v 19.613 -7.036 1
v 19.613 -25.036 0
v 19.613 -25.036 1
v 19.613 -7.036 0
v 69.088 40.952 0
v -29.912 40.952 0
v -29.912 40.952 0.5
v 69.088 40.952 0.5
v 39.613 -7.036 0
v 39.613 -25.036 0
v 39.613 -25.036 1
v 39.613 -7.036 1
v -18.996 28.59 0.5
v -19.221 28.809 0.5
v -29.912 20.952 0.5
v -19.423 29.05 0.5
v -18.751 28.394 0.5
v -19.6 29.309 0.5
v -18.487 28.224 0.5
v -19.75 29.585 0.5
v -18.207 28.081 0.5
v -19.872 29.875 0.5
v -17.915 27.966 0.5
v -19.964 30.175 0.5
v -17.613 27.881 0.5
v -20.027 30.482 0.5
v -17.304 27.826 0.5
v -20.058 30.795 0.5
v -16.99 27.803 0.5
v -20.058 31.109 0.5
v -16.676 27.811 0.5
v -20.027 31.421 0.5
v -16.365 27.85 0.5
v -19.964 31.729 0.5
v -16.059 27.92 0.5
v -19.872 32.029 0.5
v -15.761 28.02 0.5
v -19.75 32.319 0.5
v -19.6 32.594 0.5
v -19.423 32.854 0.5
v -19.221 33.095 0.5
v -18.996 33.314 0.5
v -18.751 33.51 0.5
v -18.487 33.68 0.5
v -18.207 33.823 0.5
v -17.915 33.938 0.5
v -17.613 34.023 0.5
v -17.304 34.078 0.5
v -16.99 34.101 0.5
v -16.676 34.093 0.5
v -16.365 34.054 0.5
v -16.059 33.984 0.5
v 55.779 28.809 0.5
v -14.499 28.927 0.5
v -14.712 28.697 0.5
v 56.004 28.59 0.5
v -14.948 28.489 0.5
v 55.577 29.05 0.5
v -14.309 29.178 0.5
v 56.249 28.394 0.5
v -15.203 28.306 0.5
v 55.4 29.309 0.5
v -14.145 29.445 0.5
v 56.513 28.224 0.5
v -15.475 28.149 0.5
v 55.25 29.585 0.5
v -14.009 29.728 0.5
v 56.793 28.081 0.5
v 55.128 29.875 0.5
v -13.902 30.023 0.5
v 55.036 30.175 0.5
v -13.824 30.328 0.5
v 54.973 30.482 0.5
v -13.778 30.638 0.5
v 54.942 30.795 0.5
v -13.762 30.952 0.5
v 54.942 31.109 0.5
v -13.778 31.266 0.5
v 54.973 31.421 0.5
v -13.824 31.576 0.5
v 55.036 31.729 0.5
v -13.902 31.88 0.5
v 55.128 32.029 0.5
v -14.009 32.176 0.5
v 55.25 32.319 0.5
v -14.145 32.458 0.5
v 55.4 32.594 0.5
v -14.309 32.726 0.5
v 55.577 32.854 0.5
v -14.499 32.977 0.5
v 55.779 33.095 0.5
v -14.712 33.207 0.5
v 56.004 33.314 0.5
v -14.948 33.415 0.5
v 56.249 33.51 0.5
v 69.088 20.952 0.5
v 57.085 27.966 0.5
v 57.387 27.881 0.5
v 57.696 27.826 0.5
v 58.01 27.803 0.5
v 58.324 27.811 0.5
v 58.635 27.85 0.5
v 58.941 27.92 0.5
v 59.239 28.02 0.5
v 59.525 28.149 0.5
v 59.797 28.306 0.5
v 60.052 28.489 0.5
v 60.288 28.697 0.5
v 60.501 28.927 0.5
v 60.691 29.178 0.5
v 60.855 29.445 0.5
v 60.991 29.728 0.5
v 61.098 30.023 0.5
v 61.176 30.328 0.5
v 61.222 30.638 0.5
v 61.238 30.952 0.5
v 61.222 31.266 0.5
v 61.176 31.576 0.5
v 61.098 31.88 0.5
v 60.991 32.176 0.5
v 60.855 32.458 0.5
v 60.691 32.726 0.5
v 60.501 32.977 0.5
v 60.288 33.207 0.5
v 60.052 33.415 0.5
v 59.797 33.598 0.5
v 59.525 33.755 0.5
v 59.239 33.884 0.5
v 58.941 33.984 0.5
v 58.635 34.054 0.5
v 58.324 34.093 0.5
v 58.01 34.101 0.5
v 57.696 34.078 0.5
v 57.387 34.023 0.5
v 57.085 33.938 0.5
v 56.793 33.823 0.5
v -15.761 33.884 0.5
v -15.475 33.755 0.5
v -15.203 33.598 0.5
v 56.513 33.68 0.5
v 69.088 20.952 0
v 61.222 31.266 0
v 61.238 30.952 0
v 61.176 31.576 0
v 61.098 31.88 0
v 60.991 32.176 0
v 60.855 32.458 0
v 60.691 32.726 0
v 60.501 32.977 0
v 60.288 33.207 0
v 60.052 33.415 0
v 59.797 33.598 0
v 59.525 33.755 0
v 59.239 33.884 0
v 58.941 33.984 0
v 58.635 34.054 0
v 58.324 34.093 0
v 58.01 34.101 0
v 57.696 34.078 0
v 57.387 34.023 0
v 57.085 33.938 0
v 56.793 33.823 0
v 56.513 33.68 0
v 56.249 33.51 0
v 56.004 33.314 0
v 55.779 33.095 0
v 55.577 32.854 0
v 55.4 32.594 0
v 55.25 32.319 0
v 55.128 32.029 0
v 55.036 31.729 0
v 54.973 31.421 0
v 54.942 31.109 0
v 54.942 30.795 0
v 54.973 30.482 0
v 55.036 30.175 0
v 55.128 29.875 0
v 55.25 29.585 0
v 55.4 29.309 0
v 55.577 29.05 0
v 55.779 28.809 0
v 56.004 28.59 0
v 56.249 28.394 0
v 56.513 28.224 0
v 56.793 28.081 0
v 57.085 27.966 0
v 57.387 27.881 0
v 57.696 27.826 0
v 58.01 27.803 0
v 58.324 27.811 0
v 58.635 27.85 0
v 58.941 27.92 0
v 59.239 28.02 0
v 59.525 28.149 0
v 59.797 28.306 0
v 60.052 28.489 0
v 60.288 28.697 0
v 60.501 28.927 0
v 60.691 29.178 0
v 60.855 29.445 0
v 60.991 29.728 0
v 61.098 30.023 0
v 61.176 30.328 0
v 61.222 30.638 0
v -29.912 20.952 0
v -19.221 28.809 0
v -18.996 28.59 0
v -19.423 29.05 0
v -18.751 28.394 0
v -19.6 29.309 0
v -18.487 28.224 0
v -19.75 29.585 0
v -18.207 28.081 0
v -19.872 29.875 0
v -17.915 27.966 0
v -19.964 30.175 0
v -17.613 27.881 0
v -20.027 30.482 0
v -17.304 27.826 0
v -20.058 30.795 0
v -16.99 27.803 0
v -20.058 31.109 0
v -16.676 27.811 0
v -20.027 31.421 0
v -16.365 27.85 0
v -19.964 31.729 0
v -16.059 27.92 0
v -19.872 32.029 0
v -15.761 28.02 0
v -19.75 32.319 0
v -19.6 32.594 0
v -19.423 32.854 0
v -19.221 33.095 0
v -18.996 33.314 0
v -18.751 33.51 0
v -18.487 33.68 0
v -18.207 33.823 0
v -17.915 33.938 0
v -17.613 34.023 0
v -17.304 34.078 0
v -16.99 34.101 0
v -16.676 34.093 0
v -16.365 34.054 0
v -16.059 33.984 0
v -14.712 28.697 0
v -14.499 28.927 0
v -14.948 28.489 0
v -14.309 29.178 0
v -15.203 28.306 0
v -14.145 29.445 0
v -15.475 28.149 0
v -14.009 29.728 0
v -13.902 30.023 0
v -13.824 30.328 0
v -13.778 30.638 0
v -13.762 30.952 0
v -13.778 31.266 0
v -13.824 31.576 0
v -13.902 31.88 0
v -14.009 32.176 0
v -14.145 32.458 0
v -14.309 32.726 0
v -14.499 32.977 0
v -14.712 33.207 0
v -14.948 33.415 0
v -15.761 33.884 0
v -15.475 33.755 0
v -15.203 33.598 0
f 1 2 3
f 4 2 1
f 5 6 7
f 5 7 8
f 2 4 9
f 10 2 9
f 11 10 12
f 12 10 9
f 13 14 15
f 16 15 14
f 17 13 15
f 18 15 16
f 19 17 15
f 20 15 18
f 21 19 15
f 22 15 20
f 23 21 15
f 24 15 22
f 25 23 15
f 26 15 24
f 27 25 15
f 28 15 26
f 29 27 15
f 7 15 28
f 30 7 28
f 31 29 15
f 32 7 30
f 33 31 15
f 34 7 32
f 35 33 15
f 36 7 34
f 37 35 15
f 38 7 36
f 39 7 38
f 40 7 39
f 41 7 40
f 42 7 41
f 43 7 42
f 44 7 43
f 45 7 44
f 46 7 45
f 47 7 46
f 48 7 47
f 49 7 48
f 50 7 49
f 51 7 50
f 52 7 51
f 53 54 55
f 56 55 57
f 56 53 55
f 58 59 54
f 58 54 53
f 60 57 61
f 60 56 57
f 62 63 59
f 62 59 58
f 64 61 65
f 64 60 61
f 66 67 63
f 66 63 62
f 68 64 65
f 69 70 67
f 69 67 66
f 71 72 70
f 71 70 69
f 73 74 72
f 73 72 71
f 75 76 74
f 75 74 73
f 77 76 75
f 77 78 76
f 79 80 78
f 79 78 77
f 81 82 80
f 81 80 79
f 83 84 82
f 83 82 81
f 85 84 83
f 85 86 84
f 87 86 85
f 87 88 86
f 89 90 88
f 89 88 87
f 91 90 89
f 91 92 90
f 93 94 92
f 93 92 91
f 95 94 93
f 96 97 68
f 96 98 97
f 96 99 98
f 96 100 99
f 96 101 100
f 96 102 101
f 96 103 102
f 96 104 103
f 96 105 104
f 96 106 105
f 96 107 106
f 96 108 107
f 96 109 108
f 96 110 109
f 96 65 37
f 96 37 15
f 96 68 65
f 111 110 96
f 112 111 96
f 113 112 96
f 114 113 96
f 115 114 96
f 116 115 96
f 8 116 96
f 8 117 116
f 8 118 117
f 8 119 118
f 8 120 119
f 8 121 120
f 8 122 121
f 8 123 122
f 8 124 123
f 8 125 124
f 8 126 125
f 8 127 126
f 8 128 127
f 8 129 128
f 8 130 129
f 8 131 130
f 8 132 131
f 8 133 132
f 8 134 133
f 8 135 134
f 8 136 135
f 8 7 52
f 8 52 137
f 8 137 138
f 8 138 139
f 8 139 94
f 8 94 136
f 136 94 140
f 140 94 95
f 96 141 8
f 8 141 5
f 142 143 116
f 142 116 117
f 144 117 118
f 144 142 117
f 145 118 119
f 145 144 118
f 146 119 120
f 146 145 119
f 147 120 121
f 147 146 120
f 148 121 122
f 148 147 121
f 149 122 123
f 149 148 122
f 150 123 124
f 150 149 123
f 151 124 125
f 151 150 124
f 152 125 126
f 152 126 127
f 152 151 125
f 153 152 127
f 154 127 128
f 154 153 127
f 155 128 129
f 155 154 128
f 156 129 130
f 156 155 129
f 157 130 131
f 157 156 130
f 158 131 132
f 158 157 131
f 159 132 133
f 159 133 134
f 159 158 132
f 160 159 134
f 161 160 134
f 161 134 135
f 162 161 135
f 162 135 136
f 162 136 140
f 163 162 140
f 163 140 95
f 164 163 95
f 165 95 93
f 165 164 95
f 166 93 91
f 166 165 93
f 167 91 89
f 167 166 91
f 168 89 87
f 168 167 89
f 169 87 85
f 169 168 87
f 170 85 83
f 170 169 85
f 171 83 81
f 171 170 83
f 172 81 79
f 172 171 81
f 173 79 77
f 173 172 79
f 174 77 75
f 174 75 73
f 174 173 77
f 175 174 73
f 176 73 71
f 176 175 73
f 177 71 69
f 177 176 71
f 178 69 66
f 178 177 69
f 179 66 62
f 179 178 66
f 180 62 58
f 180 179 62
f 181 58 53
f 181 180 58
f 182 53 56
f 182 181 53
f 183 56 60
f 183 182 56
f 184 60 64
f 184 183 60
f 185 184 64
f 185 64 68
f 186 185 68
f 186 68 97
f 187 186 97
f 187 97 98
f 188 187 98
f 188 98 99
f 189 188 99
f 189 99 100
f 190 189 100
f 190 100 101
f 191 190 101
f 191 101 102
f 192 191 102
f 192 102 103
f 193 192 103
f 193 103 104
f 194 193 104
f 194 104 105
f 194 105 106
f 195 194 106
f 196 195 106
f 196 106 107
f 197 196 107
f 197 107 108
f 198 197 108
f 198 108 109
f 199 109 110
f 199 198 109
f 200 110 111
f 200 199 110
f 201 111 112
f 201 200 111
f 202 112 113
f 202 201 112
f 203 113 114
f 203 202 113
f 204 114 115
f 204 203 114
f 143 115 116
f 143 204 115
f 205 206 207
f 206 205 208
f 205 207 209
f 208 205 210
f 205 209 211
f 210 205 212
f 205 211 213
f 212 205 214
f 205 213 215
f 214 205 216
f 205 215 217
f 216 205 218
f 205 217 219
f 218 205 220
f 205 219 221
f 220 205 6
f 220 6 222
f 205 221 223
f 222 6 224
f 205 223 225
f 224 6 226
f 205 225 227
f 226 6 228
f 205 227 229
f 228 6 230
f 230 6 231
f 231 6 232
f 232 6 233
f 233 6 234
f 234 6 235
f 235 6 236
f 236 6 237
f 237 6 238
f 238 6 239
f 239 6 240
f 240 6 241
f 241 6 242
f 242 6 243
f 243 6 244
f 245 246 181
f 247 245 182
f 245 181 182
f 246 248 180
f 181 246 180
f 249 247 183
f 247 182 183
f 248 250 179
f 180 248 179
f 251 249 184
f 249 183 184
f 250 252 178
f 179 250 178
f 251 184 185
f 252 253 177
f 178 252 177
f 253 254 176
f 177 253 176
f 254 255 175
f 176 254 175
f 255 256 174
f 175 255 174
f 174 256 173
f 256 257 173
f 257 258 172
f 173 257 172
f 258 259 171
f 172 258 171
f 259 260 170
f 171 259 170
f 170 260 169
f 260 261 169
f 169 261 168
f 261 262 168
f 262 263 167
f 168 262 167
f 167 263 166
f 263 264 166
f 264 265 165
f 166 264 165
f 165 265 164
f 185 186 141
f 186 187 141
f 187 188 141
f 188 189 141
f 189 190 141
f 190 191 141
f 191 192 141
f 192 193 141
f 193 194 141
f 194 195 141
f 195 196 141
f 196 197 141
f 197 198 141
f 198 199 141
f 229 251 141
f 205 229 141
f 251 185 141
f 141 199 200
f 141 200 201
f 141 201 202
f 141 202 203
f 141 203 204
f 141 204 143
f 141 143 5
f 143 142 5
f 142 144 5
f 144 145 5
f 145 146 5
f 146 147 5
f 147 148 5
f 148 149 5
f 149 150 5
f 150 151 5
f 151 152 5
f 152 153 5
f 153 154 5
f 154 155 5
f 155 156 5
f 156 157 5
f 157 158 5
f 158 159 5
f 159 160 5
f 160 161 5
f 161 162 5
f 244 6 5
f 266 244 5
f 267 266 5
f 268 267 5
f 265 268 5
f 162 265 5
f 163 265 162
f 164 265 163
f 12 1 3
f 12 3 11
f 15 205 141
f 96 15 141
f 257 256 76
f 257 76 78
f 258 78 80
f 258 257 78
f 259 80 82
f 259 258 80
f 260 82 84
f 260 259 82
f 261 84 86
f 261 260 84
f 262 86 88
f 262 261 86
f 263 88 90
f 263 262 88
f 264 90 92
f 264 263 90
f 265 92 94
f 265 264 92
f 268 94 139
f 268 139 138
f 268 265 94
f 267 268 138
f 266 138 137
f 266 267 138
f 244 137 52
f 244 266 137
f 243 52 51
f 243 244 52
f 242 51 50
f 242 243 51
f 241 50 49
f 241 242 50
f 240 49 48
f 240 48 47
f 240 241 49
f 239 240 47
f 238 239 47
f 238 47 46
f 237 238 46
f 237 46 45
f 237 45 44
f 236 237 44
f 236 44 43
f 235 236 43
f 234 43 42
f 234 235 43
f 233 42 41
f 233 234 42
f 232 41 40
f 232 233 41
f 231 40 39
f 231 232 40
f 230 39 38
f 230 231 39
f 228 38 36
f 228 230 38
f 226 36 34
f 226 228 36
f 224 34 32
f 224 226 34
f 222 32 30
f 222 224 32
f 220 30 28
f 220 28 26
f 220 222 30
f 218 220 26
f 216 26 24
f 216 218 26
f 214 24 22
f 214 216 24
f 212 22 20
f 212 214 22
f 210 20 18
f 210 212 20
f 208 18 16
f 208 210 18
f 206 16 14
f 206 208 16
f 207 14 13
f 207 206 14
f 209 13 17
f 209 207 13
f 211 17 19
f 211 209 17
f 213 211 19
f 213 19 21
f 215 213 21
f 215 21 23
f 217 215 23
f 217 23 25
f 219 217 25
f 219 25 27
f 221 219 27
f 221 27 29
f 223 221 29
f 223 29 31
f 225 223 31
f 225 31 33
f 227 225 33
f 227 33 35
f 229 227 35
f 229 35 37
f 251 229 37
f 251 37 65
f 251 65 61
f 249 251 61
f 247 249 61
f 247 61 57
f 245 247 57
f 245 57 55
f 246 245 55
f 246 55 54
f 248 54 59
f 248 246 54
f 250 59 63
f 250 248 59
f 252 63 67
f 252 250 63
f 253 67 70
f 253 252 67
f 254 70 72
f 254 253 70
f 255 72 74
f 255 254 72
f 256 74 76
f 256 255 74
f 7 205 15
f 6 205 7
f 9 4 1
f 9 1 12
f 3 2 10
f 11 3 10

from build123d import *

# Parameters (mm, degrees)
F0_W     = 99
F0_H     = 20
F0_R     = 3.15
F1_DEPTH = 0.5
F0_W_2   = 20
F0_H_2   = 18
F2_DEPTH = 1


with BuildPart() as f1:
    # F0 (on Top) → F1 (new body)
    with BuildSketch(Plane.XY):
        with Locations((19.58815, 30.951968)):
            Rectangle(F0_W, F0_H)
        with Locations((-16.91185, 30.951968)):
            Circle(F0_R, mode=Mode.SUBTRACT)
        with Locations((58.08815, 30.951968)):
            Circle(F0_R, mode=Mode.SUBTRACT)
    extrude(amount=F1_DEPTH)


with BuildPart() as f2:
    # F0 (on Top) → F2 (new body)
    with BuildSketch(Plane.XY):
        with Locations((29.613313, -16.036072)):
            Rectangle(F0_W_2, F0_H_2)
    extrude(amount=F2_DEPTH)


solid = Compound([f1.part, f2.part])
